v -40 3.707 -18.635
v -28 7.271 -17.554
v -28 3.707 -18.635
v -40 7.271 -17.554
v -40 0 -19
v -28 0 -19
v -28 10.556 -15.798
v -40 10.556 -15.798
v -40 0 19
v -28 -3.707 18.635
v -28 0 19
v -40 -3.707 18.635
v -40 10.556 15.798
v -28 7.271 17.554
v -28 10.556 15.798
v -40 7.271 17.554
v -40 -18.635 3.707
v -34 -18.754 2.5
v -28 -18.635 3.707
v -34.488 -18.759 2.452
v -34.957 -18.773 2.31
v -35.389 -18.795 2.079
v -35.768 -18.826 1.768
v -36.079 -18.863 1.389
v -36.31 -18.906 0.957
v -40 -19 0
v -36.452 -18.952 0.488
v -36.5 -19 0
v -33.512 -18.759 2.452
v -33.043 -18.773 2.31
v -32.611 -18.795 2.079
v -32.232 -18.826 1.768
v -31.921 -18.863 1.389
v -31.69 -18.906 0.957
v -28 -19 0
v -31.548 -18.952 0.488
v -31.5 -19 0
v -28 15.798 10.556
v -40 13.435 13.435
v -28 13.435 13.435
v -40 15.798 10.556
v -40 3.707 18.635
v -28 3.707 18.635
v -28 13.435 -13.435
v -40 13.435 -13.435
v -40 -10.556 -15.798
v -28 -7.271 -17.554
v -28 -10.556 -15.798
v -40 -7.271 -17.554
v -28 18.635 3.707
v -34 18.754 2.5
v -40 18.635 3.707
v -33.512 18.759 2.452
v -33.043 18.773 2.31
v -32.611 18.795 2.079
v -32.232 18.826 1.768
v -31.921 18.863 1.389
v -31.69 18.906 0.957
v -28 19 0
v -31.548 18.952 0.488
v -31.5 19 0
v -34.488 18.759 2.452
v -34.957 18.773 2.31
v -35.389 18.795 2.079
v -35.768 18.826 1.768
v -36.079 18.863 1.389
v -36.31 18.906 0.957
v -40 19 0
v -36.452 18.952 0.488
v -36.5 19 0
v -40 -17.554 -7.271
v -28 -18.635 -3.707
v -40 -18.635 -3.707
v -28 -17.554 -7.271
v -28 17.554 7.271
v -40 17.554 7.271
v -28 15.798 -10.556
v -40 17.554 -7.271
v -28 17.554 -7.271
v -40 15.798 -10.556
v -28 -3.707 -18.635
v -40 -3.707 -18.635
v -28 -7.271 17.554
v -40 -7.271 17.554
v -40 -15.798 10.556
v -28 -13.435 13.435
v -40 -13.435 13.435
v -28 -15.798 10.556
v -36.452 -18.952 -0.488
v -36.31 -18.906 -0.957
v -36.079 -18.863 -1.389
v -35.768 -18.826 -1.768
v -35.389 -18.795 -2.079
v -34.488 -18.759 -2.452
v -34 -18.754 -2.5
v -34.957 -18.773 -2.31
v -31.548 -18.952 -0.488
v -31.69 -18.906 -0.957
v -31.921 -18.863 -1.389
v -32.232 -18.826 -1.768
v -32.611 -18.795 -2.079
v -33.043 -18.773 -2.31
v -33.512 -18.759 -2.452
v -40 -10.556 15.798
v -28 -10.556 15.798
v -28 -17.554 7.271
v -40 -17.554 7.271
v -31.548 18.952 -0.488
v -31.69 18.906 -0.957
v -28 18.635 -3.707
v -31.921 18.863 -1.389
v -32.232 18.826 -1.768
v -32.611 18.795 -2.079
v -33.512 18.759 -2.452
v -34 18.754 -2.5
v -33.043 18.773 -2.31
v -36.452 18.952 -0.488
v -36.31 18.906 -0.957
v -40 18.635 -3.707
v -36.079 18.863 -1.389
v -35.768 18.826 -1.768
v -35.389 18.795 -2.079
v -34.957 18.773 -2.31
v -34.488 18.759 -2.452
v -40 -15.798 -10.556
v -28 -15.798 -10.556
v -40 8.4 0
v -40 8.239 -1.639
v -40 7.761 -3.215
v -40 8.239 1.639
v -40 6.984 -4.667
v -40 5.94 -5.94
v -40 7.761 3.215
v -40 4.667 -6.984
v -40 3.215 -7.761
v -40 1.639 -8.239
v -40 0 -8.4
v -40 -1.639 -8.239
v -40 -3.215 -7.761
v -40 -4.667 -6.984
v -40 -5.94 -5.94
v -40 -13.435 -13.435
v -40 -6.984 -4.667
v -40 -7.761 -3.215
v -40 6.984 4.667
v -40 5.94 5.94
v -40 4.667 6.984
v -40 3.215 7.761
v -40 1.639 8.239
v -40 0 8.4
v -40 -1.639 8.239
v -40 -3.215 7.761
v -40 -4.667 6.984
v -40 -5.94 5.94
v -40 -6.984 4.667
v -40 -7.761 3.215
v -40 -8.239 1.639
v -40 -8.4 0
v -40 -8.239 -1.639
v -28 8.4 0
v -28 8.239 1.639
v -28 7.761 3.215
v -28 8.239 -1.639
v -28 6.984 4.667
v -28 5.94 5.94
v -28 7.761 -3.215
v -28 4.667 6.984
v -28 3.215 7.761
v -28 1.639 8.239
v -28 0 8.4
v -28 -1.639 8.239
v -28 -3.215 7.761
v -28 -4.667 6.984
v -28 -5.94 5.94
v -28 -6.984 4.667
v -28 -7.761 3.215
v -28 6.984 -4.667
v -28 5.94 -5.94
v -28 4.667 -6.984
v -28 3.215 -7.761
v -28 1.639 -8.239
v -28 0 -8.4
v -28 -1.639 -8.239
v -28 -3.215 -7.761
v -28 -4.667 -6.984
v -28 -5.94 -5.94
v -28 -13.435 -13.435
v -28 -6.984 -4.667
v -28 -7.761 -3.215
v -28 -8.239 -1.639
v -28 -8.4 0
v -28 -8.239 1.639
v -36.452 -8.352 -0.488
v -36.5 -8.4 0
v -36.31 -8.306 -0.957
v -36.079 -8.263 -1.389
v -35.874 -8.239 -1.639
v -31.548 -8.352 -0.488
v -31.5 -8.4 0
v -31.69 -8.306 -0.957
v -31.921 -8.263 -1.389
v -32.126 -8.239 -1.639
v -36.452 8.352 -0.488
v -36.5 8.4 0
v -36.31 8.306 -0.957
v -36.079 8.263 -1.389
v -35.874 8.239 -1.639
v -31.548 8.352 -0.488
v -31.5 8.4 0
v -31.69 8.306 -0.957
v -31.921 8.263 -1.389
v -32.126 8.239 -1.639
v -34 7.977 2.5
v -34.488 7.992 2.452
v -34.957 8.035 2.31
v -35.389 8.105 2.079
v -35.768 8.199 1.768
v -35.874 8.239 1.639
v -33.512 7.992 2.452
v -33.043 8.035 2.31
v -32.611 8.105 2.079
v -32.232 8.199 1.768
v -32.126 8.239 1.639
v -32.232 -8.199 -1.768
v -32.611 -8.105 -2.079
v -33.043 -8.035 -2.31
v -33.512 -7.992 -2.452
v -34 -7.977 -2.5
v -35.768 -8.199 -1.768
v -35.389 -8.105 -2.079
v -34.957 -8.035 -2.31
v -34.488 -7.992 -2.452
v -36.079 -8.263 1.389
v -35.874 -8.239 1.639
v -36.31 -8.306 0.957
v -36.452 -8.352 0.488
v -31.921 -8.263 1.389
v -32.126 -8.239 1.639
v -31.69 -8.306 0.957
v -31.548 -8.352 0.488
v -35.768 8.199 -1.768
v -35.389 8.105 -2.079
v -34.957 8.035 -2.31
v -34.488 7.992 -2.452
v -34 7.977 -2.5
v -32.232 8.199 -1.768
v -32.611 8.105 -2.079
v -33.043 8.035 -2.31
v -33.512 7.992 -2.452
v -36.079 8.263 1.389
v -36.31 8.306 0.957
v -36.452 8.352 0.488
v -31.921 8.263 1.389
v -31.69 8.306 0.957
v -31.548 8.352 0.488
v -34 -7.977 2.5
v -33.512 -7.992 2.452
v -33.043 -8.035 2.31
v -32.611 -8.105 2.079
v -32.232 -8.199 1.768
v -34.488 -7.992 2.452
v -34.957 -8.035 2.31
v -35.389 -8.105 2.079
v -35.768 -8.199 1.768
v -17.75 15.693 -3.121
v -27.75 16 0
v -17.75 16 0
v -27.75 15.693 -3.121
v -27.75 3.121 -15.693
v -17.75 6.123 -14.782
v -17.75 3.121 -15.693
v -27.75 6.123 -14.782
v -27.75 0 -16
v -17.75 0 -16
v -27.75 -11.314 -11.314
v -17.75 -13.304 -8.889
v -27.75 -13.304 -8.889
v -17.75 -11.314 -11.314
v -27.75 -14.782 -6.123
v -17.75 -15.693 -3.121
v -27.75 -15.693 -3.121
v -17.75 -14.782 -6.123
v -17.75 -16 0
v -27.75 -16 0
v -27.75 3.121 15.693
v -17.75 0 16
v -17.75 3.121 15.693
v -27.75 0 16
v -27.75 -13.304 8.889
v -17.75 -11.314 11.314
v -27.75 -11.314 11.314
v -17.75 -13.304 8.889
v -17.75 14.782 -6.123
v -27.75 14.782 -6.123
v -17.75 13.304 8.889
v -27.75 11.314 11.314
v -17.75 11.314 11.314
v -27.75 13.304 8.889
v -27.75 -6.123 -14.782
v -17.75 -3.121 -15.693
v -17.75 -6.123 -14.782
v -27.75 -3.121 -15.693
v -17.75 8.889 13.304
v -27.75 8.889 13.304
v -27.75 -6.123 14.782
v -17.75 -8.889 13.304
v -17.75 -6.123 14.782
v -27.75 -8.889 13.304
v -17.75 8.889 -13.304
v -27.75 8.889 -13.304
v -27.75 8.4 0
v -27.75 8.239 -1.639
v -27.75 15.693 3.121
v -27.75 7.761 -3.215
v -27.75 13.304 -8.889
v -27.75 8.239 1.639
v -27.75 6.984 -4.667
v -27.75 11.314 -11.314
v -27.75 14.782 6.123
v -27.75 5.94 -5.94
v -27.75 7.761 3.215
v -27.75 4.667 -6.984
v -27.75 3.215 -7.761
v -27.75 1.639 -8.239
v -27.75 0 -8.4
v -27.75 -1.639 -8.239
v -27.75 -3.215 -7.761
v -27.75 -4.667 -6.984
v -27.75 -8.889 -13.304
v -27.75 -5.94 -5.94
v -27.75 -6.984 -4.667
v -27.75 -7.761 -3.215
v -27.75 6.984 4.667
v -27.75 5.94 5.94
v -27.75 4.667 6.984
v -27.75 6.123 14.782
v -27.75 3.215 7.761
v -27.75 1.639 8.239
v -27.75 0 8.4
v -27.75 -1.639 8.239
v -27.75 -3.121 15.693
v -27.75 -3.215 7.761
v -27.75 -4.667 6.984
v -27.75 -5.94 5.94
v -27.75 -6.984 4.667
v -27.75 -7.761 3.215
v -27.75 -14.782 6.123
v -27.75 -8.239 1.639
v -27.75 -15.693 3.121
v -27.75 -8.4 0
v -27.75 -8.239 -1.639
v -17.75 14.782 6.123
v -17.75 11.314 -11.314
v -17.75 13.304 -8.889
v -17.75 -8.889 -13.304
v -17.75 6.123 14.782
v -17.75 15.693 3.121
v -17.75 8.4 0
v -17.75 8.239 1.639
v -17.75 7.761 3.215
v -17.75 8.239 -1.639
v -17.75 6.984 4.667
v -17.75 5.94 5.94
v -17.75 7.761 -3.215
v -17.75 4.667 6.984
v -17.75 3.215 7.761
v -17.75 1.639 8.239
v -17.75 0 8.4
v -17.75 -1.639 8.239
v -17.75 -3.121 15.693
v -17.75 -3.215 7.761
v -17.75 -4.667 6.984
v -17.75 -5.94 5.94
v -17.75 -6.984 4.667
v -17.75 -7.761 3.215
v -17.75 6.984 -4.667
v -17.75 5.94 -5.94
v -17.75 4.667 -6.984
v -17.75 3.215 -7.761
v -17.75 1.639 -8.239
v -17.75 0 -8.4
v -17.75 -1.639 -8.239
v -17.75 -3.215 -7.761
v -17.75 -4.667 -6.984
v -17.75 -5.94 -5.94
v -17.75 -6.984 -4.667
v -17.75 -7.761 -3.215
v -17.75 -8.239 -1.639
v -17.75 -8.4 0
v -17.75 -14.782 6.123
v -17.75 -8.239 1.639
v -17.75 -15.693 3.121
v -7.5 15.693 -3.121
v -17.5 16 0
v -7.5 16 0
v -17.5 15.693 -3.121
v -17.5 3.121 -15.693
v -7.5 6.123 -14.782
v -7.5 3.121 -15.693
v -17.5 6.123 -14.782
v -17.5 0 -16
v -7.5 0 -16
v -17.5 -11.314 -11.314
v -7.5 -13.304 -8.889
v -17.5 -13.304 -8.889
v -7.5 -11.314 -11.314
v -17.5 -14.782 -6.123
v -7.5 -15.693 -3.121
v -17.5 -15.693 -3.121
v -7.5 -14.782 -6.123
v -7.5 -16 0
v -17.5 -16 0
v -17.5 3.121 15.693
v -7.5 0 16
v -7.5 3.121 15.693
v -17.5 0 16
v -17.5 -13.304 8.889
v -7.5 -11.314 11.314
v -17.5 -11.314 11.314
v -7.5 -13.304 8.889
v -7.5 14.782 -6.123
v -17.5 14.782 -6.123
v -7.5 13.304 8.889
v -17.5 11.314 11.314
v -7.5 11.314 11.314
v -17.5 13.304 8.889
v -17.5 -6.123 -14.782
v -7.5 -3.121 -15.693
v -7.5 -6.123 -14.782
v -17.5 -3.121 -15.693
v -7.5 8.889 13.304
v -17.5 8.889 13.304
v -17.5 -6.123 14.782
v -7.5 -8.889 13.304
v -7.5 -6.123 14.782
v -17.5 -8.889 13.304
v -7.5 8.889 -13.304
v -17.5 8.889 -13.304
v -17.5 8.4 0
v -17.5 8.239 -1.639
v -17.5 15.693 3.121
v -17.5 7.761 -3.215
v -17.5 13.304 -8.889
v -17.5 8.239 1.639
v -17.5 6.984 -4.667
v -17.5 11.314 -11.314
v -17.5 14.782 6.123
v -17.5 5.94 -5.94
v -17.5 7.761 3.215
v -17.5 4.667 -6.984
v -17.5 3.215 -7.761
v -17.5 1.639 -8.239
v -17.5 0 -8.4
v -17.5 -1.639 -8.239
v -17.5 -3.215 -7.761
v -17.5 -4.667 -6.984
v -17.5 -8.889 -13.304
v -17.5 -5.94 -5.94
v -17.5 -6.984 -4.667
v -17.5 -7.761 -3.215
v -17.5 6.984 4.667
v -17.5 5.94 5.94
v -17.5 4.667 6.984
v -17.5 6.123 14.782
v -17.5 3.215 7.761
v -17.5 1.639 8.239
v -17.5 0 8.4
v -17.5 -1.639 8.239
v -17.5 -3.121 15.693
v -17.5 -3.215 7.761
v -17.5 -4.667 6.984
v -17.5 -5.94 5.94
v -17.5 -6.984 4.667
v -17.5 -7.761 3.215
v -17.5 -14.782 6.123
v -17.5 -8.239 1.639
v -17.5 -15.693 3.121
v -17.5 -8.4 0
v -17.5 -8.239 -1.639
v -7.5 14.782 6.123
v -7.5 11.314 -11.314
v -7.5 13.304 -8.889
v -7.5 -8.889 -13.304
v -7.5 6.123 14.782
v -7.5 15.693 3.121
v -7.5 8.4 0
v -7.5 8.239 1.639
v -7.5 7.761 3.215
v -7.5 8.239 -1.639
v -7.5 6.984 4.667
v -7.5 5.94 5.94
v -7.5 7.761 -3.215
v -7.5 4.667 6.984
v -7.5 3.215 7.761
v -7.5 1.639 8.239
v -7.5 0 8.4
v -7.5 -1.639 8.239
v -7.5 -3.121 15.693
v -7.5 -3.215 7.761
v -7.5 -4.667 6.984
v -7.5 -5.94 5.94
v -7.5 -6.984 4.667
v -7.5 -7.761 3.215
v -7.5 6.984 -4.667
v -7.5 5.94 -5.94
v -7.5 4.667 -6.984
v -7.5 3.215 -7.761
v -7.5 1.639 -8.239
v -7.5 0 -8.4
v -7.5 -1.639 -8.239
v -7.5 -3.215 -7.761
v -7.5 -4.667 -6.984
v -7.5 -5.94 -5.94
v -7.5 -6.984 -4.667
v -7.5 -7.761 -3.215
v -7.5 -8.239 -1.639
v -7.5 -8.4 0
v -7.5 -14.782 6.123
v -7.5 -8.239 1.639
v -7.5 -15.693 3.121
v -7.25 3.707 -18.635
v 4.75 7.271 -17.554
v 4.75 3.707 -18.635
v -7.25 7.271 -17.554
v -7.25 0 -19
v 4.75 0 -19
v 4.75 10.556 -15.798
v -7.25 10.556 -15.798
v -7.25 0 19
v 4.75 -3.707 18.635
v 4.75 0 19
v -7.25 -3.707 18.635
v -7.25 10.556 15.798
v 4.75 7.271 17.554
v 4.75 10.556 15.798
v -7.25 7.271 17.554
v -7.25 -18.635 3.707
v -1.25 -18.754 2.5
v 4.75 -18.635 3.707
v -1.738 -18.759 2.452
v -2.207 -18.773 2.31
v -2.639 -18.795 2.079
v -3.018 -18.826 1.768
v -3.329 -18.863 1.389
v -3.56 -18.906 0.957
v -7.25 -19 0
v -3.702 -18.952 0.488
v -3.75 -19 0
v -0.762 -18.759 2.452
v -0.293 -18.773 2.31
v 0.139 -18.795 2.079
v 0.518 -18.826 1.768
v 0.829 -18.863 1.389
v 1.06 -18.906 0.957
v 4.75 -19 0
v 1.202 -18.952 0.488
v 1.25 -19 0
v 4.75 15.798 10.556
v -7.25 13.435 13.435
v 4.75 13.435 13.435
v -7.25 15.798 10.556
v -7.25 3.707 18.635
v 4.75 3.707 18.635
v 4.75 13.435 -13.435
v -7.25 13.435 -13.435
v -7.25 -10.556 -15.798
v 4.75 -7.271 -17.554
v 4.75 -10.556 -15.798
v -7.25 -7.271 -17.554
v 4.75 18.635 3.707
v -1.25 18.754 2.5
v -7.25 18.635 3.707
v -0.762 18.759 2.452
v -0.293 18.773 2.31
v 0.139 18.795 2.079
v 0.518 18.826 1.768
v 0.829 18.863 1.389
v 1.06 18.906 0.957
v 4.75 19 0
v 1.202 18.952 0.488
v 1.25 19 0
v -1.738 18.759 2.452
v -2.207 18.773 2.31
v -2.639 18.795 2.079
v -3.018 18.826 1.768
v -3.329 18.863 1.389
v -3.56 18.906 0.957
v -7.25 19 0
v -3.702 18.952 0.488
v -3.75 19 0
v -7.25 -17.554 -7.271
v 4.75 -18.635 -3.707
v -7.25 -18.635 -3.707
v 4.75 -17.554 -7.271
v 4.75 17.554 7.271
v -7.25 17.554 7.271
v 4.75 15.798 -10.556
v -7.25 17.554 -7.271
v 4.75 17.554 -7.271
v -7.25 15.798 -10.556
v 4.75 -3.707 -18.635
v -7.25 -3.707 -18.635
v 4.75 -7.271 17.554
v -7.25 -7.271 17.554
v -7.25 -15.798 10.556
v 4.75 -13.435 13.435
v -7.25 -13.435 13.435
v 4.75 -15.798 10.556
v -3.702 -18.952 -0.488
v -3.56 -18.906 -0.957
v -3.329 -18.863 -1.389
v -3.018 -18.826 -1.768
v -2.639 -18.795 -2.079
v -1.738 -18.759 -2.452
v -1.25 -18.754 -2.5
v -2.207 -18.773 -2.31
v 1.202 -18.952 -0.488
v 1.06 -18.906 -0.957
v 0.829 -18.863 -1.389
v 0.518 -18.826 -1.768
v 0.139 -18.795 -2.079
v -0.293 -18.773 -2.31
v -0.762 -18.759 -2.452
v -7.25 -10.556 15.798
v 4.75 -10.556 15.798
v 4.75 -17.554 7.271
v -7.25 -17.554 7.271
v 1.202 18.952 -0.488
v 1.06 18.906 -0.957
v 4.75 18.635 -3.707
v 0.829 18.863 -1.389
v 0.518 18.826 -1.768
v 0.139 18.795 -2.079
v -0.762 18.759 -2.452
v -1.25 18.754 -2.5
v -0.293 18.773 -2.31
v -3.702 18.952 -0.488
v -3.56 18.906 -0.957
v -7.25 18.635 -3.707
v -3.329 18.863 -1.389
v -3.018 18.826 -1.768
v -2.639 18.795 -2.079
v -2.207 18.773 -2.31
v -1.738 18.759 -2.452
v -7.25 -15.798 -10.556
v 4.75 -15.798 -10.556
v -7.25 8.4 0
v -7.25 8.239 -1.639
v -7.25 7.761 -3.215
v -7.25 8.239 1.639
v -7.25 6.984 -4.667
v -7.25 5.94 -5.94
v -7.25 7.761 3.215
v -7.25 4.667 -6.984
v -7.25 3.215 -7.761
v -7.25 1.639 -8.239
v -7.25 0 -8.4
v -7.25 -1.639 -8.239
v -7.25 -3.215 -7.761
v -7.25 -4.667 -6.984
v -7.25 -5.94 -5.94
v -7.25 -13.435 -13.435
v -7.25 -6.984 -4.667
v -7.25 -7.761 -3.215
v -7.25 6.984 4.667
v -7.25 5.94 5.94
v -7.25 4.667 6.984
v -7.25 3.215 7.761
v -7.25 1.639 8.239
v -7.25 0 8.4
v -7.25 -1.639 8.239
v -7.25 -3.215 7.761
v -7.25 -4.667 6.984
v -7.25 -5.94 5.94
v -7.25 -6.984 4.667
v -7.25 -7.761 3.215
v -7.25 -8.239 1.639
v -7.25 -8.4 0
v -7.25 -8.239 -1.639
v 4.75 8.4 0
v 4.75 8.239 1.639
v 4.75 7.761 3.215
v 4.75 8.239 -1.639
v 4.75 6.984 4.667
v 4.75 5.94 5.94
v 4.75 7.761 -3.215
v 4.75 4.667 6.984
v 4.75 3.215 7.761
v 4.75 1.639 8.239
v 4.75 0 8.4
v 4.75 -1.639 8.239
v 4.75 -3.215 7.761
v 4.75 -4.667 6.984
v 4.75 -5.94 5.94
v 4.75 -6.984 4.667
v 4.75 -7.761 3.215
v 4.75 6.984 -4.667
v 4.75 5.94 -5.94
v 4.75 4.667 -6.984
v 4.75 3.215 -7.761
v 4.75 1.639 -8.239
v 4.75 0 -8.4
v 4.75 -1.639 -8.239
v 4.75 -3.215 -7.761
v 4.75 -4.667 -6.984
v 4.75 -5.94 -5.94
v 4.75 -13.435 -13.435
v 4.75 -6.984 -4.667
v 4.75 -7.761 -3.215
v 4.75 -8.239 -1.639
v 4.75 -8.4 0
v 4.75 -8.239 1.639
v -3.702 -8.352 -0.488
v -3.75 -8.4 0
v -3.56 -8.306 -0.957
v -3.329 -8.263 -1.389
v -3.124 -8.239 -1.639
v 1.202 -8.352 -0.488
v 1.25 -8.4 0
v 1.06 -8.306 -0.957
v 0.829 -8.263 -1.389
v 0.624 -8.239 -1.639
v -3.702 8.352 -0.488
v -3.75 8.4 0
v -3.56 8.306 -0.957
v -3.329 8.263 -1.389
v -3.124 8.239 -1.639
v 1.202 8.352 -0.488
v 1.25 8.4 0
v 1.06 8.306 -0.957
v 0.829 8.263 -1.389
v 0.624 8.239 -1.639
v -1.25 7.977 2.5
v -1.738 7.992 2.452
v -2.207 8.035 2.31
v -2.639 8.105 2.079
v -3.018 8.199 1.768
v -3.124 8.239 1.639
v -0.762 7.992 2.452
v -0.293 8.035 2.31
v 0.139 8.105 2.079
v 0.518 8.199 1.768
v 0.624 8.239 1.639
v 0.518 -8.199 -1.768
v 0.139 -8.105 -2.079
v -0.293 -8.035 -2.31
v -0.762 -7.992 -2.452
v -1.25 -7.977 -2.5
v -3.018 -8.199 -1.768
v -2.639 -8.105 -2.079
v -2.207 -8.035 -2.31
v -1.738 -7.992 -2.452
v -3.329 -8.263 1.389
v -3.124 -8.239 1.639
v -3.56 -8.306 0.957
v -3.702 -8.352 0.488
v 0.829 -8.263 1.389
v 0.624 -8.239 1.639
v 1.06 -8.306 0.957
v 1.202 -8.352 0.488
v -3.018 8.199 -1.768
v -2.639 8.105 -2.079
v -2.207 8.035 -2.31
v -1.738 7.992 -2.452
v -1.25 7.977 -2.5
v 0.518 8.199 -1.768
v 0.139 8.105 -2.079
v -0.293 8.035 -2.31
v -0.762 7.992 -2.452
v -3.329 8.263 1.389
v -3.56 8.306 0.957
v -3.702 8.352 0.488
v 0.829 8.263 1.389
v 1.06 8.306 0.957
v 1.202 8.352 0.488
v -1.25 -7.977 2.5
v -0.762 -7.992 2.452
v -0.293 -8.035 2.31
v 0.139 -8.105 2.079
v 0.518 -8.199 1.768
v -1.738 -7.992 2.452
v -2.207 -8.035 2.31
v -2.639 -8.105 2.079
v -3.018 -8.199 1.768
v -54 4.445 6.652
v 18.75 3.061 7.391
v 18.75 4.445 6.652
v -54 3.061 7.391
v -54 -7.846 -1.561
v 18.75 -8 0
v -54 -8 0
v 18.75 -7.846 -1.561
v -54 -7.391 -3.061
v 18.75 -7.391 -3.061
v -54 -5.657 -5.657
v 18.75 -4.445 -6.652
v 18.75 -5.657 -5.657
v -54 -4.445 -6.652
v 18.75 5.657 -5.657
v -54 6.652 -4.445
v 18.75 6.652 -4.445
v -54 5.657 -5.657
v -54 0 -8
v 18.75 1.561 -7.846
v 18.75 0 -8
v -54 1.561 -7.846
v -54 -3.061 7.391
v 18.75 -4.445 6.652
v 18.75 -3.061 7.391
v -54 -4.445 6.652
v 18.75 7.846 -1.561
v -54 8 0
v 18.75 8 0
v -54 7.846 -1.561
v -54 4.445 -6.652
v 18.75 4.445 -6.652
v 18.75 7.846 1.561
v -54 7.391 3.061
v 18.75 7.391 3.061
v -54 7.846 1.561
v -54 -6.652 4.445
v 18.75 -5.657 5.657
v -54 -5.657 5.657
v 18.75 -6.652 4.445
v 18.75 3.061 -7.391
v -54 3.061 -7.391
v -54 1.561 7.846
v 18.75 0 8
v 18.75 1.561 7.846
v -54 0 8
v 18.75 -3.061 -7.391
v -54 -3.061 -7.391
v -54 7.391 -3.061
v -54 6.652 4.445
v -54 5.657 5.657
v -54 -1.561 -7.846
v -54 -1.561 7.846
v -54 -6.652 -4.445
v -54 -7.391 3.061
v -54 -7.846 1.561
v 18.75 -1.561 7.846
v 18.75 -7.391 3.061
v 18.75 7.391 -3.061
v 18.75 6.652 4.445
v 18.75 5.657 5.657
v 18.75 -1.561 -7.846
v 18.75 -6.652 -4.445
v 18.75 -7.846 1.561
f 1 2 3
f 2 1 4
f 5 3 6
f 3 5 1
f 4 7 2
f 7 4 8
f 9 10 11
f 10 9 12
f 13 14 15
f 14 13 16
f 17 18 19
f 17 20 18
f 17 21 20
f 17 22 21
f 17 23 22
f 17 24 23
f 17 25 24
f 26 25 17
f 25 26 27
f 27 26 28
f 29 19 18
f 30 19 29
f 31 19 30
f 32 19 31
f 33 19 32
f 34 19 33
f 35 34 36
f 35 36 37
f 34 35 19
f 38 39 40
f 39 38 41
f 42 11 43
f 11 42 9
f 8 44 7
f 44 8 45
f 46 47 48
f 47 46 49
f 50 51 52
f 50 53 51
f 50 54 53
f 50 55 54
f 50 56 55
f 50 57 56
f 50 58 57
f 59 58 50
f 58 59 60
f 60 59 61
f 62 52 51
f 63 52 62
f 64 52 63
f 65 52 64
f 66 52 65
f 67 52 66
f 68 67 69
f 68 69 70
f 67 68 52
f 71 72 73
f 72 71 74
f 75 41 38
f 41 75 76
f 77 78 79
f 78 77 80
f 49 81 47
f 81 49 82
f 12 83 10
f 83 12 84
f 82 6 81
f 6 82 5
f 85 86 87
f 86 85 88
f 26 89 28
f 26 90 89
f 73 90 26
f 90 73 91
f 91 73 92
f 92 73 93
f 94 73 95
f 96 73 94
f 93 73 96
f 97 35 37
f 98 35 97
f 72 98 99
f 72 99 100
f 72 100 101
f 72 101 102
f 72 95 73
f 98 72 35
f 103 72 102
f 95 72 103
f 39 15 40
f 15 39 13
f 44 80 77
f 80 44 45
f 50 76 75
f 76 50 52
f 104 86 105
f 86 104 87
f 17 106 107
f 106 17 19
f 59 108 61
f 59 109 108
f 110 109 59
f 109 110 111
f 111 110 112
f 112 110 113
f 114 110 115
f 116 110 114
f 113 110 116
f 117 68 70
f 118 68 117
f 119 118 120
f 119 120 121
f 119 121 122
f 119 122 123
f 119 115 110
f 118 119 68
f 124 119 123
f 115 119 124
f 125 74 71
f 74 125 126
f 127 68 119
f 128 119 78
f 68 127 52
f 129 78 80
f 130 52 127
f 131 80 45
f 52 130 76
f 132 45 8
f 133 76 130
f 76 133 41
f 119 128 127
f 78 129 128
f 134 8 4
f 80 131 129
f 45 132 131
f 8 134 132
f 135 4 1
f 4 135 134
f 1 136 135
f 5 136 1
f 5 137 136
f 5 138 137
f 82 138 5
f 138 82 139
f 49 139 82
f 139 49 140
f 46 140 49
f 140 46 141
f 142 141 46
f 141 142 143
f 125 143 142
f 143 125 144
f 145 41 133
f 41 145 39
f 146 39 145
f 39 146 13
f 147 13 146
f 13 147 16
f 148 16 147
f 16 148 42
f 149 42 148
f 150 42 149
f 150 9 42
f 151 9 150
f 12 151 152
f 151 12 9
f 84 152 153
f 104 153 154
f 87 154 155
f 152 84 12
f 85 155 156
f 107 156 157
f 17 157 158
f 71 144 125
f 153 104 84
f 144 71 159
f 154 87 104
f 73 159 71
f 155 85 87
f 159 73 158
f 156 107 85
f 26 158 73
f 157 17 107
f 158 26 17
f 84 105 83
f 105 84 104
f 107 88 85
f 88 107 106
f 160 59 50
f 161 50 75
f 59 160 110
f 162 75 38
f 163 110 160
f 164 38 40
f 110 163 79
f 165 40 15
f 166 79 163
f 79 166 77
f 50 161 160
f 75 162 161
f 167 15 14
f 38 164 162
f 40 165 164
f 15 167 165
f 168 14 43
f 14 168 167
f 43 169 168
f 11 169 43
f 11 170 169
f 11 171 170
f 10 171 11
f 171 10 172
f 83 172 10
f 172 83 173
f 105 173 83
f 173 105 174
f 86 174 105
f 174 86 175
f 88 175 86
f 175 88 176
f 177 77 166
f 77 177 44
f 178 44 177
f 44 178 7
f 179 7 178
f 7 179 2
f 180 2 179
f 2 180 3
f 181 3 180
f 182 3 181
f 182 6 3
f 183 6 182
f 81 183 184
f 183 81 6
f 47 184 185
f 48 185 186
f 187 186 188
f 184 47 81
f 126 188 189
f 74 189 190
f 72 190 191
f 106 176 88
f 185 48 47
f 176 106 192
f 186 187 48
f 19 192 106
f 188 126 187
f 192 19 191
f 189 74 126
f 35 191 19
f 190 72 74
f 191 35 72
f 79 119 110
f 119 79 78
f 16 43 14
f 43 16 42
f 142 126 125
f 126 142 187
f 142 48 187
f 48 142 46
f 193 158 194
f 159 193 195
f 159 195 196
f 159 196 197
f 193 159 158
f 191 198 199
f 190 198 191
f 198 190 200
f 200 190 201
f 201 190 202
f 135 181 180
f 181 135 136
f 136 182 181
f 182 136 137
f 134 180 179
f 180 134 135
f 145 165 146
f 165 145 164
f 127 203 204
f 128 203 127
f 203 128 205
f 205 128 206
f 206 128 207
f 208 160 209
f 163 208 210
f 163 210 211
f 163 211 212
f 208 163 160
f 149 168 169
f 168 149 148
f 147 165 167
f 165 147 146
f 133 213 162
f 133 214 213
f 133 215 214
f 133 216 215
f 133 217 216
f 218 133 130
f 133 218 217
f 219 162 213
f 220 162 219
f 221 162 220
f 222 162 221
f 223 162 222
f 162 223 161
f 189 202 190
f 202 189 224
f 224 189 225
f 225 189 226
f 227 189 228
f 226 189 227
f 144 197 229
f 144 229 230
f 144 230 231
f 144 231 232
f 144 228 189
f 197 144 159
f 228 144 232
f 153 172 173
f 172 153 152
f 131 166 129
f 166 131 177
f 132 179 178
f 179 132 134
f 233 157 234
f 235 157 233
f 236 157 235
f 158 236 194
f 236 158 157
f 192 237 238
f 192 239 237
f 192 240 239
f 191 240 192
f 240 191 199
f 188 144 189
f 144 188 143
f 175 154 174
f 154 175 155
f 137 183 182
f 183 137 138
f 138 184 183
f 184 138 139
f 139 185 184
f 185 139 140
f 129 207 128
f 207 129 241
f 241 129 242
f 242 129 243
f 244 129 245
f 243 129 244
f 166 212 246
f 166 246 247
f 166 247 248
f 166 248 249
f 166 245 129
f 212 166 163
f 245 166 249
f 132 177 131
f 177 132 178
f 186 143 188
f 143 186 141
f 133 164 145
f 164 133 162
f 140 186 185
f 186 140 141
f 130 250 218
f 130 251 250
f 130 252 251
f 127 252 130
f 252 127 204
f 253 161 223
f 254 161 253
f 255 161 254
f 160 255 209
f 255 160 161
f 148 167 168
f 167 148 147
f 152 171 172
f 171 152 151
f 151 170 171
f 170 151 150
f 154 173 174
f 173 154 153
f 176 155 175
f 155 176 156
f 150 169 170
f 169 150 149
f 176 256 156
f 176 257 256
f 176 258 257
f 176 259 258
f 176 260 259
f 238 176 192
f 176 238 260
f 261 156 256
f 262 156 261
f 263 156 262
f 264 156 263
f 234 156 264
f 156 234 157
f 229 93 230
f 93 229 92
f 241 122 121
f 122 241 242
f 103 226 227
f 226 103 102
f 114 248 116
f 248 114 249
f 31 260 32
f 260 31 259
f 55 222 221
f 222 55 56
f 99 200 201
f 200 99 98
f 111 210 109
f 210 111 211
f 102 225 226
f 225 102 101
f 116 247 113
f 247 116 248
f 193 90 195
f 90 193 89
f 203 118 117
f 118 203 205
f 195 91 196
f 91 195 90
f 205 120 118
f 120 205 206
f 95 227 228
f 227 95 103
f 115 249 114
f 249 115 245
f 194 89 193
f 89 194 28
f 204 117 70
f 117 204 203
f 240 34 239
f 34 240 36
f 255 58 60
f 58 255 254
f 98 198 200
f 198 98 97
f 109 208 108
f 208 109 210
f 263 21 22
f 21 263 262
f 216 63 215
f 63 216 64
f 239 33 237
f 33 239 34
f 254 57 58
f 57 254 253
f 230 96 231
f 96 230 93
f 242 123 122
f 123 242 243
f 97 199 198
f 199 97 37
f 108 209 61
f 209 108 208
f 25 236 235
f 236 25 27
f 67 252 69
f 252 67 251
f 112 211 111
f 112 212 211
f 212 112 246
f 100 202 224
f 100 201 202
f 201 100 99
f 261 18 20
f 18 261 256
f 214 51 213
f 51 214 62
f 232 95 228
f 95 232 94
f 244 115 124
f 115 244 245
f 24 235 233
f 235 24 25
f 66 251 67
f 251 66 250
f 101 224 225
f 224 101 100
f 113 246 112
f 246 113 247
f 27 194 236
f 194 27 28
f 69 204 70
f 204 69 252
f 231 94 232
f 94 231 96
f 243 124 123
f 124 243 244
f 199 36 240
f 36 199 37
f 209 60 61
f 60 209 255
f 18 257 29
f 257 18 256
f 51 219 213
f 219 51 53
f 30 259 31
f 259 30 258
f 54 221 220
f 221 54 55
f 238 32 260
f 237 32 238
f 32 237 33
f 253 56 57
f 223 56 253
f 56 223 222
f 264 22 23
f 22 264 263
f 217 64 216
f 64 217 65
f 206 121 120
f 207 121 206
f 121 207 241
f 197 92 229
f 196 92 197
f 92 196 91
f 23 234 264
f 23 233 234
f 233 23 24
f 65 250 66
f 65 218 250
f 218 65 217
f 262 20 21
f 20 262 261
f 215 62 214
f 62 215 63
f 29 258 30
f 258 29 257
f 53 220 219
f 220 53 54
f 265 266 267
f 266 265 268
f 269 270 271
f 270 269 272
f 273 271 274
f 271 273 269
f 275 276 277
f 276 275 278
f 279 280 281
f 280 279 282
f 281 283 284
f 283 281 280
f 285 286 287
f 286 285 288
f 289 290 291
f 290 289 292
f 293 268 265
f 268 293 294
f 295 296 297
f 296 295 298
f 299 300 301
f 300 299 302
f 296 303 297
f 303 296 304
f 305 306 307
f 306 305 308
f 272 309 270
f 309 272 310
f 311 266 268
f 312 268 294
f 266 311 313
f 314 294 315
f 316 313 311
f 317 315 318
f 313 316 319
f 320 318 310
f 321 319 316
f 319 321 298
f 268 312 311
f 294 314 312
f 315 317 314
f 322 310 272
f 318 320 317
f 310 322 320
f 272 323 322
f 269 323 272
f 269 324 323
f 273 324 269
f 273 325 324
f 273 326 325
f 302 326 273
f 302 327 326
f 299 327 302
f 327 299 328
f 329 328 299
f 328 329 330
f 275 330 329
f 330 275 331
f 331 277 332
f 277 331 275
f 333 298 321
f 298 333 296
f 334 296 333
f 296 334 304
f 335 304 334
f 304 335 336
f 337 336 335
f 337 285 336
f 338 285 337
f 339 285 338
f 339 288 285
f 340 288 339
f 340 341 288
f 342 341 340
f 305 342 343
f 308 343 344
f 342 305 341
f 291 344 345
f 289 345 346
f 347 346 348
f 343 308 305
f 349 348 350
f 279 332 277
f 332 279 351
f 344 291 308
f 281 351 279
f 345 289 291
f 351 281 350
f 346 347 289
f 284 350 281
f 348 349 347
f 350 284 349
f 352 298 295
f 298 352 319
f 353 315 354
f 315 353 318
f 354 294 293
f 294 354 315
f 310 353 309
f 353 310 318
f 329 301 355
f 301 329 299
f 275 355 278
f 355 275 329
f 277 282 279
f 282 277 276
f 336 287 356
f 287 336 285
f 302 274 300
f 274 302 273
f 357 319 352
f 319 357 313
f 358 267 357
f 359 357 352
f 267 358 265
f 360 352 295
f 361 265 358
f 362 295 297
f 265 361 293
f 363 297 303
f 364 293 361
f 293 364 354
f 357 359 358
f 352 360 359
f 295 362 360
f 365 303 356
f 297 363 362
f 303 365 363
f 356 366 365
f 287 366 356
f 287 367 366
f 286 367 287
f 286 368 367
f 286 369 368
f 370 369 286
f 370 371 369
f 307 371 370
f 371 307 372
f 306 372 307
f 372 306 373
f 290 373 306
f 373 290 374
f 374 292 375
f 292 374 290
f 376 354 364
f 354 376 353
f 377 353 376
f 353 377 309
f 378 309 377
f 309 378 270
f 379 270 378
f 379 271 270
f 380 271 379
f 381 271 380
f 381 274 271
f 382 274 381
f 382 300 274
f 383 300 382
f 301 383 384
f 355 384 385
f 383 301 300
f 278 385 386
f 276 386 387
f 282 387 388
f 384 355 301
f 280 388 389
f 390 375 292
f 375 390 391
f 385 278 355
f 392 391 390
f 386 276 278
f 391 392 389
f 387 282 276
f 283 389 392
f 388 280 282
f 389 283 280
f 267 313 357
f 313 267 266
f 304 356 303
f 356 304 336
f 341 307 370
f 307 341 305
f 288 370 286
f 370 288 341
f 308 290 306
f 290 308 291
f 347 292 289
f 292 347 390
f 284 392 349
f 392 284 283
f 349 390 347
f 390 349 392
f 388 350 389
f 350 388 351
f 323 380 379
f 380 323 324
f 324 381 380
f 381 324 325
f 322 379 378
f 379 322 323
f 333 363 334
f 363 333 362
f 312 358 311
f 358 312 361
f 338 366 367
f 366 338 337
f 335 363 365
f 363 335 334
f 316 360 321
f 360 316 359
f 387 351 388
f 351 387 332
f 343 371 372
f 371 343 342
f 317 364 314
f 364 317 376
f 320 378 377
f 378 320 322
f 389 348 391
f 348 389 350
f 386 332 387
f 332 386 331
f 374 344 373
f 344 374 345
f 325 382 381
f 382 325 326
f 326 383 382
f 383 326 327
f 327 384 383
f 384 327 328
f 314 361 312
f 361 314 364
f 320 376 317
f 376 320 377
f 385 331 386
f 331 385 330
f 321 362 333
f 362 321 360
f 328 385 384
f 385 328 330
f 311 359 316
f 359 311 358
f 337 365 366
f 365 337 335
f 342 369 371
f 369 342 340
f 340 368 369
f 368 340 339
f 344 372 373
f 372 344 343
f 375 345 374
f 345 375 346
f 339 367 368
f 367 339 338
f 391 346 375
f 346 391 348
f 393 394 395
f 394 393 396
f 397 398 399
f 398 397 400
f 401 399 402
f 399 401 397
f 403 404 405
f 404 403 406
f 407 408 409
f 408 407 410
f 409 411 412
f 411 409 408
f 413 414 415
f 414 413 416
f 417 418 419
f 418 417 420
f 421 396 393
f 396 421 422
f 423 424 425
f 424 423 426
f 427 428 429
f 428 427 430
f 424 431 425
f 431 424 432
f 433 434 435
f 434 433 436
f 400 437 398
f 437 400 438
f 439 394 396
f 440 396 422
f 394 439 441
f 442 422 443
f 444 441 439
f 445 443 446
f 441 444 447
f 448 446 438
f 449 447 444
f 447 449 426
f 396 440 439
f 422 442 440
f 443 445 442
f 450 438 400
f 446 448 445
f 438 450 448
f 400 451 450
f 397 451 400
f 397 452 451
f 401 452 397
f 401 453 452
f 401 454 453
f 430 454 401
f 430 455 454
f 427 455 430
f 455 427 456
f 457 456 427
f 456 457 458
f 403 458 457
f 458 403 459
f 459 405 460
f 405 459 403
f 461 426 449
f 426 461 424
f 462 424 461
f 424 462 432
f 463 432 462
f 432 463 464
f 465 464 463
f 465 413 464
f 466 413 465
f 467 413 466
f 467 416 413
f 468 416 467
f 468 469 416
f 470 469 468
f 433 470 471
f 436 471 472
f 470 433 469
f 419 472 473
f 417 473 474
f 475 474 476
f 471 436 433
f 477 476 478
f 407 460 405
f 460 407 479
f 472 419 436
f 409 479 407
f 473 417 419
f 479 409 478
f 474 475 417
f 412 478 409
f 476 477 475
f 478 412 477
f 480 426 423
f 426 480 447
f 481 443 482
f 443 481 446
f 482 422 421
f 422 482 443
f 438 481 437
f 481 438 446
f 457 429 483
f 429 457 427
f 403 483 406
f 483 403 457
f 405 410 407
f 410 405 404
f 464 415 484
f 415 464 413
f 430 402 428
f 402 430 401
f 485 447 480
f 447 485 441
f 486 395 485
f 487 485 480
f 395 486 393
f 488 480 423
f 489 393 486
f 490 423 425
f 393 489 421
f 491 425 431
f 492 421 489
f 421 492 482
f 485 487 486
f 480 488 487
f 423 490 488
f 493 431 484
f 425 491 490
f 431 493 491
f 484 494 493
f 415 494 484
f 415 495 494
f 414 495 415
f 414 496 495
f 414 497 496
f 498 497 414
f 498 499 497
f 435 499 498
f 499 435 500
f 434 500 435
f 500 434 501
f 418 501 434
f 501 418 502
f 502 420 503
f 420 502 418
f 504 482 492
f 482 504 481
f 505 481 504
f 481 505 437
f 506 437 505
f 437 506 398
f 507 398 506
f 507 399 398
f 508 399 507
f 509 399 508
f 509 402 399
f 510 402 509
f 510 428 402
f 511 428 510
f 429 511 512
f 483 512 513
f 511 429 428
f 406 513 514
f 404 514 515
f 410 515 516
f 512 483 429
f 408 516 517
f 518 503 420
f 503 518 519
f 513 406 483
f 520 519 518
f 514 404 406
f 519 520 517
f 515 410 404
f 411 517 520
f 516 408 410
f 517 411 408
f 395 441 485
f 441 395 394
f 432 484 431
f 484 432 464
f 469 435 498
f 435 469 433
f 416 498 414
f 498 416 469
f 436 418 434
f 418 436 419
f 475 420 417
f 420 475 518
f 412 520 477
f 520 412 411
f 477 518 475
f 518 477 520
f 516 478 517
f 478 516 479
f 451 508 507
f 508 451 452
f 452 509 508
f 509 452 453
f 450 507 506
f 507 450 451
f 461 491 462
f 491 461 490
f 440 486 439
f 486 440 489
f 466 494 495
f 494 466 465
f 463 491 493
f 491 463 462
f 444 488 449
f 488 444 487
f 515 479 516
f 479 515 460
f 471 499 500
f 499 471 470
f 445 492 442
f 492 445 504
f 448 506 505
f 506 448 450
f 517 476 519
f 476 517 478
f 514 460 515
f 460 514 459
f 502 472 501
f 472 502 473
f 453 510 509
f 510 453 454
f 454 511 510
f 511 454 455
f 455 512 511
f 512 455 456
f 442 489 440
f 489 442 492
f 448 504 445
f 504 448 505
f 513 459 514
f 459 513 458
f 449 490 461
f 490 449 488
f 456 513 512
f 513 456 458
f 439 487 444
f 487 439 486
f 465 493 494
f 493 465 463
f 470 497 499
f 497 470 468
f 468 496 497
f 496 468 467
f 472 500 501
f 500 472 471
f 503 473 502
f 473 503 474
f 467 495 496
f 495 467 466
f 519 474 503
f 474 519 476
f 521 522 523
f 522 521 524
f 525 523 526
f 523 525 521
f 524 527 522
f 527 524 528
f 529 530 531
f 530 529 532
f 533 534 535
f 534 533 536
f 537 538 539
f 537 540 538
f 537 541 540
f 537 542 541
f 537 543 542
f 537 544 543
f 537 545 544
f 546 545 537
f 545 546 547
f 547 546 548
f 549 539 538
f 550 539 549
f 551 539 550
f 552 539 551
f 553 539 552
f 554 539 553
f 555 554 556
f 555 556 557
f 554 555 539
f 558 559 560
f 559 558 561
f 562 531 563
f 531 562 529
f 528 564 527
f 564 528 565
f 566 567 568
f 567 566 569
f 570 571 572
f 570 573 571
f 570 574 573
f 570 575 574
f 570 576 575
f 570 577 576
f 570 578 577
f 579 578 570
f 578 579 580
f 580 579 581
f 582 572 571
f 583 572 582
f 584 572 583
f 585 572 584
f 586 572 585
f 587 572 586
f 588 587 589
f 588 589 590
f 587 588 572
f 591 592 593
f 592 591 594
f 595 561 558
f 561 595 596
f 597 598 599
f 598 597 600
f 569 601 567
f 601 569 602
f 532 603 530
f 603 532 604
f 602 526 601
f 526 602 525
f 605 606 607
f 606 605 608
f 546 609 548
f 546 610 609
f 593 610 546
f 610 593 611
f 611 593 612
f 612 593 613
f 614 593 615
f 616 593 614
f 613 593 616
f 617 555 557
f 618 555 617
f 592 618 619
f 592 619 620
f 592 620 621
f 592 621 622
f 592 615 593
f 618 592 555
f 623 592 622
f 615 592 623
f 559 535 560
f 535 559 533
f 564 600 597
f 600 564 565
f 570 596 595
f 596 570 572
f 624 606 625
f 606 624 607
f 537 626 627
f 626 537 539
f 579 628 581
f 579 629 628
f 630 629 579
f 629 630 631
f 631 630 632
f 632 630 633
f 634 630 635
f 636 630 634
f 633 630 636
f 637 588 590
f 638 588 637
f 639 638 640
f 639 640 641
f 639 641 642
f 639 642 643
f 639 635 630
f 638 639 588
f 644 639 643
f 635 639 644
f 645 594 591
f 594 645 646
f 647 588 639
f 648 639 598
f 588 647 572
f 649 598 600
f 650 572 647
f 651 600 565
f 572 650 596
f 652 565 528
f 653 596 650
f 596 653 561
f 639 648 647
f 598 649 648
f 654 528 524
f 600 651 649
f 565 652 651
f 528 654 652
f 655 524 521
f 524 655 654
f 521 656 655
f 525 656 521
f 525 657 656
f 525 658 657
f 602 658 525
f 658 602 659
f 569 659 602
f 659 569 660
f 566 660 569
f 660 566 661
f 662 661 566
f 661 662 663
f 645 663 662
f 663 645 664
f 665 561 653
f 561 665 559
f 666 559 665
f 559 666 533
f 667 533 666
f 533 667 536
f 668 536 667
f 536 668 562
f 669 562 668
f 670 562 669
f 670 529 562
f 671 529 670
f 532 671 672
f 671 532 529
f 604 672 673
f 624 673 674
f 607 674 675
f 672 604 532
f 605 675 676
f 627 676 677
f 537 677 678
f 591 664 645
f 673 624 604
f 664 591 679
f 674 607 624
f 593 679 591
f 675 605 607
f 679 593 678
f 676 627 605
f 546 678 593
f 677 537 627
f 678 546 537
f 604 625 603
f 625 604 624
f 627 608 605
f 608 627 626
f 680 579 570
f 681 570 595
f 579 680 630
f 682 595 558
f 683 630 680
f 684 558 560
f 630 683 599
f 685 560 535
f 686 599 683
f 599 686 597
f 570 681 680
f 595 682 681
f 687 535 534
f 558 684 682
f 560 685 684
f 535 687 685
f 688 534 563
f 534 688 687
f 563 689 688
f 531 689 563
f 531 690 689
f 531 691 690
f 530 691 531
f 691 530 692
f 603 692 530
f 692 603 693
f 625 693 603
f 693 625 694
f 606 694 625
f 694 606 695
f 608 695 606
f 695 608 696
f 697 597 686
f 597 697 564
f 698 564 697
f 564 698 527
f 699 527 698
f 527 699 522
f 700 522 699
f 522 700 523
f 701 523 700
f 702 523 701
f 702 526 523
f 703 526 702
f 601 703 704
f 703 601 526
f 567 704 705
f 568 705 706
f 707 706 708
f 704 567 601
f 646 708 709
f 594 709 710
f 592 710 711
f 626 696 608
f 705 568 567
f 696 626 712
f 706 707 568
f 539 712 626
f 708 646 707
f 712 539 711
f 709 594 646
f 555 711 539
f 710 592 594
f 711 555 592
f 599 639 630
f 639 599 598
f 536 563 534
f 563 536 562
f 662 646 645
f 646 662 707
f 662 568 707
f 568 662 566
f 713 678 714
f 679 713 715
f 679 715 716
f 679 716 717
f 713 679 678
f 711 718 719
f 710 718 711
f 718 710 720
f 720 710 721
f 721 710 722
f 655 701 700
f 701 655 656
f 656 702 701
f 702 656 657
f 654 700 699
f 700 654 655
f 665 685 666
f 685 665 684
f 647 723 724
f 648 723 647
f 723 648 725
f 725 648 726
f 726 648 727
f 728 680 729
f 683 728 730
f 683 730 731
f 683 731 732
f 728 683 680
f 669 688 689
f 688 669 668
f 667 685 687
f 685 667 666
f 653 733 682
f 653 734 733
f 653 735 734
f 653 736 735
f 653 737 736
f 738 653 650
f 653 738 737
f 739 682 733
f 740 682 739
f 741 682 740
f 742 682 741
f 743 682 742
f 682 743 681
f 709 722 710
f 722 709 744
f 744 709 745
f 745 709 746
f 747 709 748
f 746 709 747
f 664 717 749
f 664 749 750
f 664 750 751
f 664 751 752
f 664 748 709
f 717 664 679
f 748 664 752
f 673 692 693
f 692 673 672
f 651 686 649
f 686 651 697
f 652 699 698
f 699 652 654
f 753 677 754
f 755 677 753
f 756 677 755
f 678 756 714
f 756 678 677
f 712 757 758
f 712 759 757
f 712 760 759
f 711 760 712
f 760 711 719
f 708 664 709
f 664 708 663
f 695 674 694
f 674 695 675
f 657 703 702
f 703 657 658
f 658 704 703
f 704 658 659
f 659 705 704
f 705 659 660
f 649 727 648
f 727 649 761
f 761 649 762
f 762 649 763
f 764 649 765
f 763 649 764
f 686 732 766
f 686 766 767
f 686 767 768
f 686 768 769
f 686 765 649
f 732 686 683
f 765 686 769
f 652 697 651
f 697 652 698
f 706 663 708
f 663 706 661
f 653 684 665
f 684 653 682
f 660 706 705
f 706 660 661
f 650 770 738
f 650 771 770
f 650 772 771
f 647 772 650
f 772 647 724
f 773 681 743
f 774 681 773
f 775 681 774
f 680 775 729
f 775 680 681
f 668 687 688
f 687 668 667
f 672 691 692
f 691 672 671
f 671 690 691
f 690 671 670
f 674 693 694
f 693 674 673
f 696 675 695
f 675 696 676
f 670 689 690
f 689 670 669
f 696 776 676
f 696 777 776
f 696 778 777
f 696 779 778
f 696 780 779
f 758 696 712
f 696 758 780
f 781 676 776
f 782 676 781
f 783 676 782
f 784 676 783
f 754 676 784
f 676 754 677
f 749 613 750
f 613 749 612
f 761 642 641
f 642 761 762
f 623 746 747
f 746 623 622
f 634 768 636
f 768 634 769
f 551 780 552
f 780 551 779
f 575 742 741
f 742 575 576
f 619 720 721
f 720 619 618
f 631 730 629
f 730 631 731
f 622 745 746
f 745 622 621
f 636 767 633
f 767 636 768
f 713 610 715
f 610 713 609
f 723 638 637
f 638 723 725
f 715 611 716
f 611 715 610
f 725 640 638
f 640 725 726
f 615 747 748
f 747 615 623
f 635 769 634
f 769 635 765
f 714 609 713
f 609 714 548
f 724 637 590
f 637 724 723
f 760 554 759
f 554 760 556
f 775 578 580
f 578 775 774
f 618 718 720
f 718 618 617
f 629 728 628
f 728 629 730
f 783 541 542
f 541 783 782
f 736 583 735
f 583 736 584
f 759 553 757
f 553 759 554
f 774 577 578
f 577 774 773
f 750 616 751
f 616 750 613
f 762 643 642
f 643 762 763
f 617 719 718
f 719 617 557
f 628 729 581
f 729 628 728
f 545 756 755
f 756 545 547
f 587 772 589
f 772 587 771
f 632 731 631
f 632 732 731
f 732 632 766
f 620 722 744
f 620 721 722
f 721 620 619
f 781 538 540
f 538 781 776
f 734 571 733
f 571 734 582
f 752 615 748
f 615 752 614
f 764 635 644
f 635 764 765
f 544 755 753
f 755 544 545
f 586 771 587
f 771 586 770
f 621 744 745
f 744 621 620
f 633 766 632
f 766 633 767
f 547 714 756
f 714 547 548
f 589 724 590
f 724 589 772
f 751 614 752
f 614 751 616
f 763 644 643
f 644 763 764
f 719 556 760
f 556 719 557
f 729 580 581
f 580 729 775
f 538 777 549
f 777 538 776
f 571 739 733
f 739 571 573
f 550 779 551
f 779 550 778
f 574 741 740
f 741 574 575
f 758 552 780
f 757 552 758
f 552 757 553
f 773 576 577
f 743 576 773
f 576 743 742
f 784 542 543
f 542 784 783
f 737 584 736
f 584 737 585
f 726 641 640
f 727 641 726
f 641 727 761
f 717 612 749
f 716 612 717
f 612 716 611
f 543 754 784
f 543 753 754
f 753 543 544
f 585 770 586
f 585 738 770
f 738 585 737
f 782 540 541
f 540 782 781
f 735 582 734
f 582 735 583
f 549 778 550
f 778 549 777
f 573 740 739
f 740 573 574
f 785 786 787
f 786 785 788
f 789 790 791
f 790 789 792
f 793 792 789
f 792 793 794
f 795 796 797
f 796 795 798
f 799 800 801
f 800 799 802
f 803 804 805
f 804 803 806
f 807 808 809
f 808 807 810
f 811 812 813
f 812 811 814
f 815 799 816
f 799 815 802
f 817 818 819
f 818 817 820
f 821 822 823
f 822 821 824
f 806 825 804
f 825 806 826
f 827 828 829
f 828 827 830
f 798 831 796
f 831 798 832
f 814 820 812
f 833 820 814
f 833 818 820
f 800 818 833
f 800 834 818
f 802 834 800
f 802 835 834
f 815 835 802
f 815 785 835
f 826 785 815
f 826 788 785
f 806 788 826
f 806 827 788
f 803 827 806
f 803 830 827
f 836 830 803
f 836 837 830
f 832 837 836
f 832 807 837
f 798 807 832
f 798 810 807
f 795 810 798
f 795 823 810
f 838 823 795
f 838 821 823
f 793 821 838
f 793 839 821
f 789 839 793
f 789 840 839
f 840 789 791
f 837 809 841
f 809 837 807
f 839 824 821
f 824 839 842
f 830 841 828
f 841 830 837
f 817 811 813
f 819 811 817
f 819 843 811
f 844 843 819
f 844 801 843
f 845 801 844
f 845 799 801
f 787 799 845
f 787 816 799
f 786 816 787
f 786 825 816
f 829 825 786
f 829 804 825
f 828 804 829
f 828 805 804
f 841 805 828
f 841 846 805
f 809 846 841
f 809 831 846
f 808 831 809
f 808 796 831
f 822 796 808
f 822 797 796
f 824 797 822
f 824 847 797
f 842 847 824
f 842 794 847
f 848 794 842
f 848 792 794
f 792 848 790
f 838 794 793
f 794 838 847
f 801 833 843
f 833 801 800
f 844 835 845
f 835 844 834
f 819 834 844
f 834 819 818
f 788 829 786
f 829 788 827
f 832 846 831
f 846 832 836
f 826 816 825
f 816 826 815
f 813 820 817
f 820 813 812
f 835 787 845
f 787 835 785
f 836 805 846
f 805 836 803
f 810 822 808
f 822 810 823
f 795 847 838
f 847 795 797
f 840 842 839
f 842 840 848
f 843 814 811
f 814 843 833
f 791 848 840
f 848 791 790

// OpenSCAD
$fn = 32;

// ------------------------------------------------------------------------
// Shaft with rings and collars: d16 shaft, 4 rings
// Every part is its own module, assembly() places them once.
// ------------------------------------------------------------------------

// --- part 1 ---
module shaft() {
  translate([0, 0, -36.375]) cylinder(h = 72.75, d = 16);
}

// --- part 2 ---
module collar_a() {
  difference() {
    cylinder(h = 12, d = 38);
    translate([0, 0, -1]) cylinder(h = 14, d = 16.8);
    translate([0, 0, 6]) rotate([90, 0, 0]) cylinder(h = 40, d = 5, center = true);
  }
}

// --- part 3 ---
module spacer_a() {
  difference() {
      translate([0, 0, 0]) cylinder(h = 10, d = 32);
      translate([0, 0, -1]) cylinder(h = 12, d = 16.8);
    }
}

// --- part 4 ---
module spacer_b() {
  difference() {
      translate([0, 0, 0]) cylinder(h = 10, d = 32);
      translate([0, 0, -1]) cylinder(h = 12, d = 16.8);
    }
}

// --- part 5 ---
module collar_b() {
  difference() {
    cylinder(h = 12, d = 38);
    translate([0, 0, -1]) cylinder(h = 14, d = 16.8);
    translate([0, 0, 6]) rotate([90, 0, 0]) cylinder(h = 40, d = 5, center = true);
  }
}

// --- assembly ---
module assembly() {
  translate([-17.625, 0, 0]) rotate([0, 90, 0]) shaft();
  translate([-40, 0, 0]) rotate([0, 90, 0]) collar_a();
  translate([-27.75, 0, 0]) rotate([0, 90, 0]) spacer_a();
  translate([-17.5, 0, 0]) rotate([0, 90, 0]) spacer_b();
  translate([-7.25, 0, 0]) rotate([0, 90, 0]) collar_b();
}

assembly();
